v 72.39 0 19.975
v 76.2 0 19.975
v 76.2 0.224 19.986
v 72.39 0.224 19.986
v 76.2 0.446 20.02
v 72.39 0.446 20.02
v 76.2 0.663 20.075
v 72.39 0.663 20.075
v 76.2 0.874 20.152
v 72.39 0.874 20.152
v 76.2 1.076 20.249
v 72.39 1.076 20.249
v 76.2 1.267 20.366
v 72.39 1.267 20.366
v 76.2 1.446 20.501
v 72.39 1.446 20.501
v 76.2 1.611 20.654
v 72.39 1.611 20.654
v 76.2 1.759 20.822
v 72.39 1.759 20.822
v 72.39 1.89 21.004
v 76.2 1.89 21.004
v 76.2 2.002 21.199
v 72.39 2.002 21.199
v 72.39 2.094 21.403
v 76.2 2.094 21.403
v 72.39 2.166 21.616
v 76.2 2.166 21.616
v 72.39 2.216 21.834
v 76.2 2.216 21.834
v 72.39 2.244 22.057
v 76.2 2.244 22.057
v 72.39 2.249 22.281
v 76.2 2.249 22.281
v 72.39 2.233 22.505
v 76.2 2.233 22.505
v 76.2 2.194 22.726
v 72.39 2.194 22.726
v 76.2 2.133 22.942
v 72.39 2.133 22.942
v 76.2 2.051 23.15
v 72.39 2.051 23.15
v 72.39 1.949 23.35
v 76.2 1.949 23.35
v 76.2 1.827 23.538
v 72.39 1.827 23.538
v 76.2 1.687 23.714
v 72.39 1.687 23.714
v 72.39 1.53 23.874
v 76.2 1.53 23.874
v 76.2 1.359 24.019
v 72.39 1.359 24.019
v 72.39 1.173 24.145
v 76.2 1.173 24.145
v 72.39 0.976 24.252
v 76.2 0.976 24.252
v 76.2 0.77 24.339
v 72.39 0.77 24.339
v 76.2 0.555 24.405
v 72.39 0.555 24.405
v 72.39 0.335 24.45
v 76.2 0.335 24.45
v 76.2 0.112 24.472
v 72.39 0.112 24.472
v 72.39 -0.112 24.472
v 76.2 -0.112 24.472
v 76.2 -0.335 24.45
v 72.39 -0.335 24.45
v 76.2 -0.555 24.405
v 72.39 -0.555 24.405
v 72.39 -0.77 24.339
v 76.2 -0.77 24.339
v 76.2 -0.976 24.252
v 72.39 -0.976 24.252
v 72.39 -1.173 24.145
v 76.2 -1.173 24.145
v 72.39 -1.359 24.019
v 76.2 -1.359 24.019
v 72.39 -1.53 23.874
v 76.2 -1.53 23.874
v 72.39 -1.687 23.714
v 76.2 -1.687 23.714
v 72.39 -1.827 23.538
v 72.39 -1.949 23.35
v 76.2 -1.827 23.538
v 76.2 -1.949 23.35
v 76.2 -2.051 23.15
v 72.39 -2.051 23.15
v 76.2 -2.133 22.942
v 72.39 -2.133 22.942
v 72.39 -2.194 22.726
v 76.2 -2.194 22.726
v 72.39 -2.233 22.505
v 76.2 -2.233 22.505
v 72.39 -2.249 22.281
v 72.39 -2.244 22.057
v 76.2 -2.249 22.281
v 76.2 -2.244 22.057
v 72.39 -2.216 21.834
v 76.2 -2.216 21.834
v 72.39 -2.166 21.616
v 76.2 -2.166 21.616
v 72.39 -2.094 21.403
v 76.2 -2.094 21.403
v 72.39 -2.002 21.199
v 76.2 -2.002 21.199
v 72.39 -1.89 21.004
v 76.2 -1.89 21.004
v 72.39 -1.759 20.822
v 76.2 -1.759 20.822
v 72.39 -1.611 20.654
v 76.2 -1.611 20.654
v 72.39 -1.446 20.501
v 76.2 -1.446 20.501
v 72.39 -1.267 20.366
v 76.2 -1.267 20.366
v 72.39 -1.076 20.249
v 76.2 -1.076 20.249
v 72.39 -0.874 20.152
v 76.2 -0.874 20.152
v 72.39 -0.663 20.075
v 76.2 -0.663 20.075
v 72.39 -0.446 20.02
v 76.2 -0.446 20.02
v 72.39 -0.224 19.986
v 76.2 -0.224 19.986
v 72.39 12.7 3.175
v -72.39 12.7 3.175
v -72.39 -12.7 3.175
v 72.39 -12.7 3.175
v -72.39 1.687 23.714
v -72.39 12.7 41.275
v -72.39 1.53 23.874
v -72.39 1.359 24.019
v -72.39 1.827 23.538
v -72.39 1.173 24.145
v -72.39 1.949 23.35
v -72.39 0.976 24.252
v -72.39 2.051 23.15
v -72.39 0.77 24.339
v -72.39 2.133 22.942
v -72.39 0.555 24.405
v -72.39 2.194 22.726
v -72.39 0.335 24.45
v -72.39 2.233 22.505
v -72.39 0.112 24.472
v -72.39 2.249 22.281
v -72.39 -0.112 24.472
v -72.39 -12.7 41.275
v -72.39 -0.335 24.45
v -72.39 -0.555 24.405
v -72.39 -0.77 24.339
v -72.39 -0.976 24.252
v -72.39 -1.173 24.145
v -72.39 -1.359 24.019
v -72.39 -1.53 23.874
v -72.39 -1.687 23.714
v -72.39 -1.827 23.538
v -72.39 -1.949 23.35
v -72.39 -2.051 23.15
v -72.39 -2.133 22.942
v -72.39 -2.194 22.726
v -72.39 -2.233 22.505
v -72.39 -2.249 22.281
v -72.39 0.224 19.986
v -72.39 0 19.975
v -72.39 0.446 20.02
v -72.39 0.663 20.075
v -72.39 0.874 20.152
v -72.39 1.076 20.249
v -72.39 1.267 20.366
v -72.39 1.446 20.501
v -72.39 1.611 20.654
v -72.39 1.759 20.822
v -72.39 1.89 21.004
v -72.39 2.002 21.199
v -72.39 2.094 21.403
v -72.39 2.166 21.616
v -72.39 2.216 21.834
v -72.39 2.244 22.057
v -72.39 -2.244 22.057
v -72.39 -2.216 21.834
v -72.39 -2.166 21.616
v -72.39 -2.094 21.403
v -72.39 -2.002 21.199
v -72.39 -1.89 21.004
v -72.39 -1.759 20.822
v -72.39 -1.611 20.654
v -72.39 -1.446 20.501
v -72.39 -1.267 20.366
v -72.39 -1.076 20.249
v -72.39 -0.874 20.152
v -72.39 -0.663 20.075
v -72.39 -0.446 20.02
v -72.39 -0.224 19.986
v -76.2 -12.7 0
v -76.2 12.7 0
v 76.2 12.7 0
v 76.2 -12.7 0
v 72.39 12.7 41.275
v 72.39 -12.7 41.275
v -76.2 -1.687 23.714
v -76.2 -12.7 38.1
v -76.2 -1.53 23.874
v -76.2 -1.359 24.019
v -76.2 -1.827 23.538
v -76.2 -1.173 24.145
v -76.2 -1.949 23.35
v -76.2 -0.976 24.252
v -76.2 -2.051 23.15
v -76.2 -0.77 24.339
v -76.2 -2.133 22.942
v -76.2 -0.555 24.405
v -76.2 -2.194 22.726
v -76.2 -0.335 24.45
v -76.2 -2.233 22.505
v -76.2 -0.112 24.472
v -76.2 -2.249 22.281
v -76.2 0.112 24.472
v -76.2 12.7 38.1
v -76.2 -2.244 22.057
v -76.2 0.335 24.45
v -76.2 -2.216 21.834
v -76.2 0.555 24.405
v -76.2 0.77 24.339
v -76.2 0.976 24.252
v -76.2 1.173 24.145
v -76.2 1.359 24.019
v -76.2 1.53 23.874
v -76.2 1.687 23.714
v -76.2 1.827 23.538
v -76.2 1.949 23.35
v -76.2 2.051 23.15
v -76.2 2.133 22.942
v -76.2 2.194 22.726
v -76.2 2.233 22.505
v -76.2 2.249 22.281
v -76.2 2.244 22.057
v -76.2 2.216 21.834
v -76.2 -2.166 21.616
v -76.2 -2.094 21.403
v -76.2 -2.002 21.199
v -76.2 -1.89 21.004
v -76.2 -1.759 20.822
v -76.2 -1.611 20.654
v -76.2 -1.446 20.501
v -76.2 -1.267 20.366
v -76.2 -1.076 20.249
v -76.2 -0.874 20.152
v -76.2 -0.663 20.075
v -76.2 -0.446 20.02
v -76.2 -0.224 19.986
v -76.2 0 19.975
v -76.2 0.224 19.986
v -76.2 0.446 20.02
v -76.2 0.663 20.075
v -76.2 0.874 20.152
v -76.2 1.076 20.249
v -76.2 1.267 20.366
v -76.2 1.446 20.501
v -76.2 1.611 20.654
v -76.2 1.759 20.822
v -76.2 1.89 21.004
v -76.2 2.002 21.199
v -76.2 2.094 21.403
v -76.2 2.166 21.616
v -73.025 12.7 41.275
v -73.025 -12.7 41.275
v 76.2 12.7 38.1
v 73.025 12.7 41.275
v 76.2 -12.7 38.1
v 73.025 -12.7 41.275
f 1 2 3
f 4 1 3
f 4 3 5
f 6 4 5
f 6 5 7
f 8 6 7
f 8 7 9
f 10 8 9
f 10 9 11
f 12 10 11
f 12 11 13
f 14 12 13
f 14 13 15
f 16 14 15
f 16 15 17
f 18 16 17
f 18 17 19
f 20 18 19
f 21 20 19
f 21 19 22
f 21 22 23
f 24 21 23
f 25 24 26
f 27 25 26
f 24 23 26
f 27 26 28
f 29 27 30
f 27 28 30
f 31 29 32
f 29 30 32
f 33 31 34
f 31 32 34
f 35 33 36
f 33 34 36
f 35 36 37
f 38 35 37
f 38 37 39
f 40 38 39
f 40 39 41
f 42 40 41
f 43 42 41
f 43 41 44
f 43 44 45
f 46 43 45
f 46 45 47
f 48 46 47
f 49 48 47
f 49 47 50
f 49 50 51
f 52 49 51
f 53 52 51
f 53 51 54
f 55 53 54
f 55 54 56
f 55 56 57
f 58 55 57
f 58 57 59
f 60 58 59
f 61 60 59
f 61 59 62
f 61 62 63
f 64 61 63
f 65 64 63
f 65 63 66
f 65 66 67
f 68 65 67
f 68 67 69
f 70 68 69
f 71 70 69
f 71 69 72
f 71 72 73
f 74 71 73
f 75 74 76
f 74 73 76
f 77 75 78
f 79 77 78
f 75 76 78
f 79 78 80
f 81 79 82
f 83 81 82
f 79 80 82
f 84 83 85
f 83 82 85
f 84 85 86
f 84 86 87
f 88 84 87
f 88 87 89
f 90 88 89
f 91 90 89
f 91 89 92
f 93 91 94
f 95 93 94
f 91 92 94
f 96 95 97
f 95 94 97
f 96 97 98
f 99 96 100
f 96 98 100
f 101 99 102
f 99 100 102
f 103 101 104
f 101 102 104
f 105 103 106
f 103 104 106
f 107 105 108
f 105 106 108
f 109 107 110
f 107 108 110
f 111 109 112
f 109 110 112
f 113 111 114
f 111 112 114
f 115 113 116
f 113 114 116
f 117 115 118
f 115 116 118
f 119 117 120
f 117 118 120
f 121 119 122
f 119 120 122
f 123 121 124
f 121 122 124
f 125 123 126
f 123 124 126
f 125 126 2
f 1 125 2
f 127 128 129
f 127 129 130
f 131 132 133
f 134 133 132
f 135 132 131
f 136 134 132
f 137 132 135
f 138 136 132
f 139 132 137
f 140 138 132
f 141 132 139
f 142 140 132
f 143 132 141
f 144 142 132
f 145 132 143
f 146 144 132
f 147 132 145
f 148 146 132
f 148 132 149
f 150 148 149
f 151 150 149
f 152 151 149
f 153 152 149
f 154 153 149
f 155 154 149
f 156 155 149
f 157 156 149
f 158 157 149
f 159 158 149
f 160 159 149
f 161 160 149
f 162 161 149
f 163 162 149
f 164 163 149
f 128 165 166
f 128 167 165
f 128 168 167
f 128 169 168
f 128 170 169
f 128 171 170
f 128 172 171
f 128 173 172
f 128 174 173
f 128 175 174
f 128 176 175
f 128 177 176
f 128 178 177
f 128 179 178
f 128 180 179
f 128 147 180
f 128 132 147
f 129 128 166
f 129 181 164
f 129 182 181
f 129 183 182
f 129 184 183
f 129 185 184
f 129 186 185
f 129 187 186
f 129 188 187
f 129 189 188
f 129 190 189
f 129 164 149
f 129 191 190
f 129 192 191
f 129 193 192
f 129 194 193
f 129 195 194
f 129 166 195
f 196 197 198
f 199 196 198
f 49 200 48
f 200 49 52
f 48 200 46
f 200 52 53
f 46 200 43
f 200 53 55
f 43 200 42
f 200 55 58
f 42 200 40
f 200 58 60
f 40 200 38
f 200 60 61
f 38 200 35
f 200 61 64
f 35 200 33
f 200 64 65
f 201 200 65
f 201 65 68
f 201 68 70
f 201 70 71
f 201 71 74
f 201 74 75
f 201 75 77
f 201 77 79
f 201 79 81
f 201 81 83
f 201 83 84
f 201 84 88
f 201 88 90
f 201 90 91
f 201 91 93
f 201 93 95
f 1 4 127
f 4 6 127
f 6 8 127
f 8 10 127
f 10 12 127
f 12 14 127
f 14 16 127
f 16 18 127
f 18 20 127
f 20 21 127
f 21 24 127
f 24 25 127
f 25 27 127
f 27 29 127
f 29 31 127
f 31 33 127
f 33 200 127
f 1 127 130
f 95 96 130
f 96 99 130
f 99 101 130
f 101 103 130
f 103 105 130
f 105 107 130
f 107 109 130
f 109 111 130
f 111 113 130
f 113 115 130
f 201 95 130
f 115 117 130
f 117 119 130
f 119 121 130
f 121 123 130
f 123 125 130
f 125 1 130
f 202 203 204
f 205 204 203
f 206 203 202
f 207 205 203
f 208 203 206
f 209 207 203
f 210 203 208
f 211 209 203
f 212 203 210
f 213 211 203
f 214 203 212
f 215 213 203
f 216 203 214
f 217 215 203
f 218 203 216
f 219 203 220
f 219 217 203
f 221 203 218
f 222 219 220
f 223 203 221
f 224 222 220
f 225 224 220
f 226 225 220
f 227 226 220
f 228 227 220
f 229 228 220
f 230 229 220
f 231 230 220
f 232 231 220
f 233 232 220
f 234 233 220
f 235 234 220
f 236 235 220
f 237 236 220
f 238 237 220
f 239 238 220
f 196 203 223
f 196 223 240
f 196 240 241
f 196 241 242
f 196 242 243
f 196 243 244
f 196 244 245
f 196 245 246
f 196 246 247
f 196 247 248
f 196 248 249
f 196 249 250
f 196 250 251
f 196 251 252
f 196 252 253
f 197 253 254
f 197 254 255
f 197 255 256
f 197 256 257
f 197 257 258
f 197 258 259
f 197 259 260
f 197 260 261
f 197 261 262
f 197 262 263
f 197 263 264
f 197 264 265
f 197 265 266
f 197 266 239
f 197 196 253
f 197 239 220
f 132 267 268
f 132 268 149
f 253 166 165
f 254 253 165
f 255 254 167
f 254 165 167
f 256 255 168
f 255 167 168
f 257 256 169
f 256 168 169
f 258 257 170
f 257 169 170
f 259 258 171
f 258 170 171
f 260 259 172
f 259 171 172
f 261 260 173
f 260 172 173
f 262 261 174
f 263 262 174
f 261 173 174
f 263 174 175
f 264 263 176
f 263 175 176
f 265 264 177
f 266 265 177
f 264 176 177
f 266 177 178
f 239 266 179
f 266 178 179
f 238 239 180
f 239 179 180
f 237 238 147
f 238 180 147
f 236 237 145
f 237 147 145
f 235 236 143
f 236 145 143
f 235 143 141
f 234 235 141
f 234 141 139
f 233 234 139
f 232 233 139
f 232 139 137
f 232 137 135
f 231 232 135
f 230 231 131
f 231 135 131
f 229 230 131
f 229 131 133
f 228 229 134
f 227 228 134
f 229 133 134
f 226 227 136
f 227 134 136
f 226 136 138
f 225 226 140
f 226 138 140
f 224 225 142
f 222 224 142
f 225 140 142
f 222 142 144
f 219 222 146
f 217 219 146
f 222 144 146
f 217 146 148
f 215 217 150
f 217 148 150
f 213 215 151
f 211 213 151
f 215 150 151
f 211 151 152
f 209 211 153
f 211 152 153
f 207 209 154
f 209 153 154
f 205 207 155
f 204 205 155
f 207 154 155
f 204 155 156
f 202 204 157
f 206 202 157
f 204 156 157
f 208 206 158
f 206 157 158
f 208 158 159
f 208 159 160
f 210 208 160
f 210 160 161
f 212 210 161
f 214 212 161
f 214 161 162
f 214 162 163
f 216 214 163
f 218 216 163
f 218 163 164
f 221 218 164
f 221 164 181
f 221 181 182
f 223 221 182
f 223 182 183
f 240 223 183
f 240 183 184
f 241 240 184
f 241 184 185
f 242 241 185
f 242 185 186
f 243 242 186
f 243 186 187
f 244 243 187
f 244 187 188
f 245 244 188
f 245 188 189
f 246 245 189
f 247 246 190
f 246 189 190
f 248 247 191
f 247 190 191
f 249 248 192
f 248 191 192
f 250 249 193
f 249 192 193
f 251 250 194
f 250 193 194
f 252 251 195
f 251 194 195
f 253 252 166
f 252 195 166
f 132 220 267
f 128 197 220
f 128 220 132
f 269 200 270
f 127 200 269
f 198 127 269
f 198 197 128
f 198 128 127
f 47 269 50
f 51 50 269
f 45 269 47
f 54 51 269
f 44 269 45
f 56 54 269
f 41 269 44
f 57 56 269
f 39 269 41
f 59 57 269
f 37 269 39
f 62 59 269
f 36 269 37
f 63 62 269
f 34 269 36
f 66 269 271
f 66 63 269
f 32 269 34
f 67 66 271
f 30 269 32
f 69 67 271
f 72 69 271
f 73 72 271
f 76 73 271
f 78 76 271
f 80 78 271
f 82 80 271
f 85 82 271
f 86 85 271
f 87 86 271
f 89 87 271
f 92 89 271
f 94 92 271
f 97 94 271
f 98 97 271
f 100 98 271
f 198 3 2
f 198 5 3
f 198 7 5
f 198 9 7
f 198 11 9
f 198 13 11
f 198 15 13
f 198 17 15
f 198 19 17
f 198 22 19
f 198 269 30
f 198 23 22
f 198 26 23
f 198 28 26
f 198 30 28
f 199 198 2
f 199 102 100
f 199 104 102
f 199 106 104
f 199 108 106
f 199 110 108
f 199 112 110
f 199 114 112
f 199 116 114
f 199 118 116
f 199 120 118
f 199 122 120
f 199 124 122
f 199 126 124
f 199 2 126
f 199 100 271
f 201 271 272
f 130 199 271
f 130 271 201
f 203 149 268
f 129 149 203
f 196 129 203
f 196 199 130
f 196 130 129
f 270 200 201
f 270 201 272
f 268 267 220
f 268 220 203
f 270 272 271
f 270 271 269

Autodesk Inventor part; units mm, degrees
ref_plane "YZ Plane" through (0, 0, 0) normal (1, 0, 0) x (0, 1, 0)
ref_plane "XZ Plane" through (0, 0, 0) normal (0, 1, 0) x (-1, 0, 0)
ref_plane "XY Plane" through (0, 0, 0) normal (0, 0, 1) x (1, 0, 0)
sketch "Sketch1" plane through (0, 0, 0) normal (0, 0, 1) x (1, 0, 0)
  line L0 (76.2, -12.7) -> (-76.2, -12.7)
  line L1 (-76.2, -12.7) -> (-76.2, 12.7)
  line L2 (-76.2, 12.7) -> (76.2, 12.7)
  line L3 (76.2, 12.7) -> (76.2, -12.7)
  line L4 (76.2, -12.7) -> (-76.2, 12.7) construction
  line L5 (-76.2, -12.7) -> (76.2, 12.7) construction
  line L6 (-76.2, 12.7) -> (-72.39, 12.7)
  line L7 (-72.39, 12.7) -> (-72.39, -12.7)
  line L8 (-72.39, -12.7) -> (-76.2, -12.7)
  line L9 (-76.2, -12.7) -> (-76.2, 12.7)
  line L10 (76.2, 12.7) -> (72.39, 12.7)
  line L11 (72.39, 12.7) -> (72.39, -12.7)
  line L12 (72.39, -12.7) -> (76.2, -12.7)
  line L13 (76.2, -12.7) -> (76.2, 12.7)
  point P0 (0, 0)
  dimension "d0" = 152.4
  dimension "d1" = 25.4
  dimension "d2" = 3.81
  dimension "d3" = 3.81
extrude "Extrusion1" add sketch "Sketch1" along normal blind 3.175 contours L0 L7 L2 L11
extrude "Extrusion2" add sketch "Sketch1" along normal blind 41.275 contours L0 L11 L2 L3 | L0 L1 L2 L7
chamfer "Chamfer1" distance 3.175 angle 45 2 edges at (-76.2, 0, 41.275) (76.2, 0, 41.275)
sketch "Sketch2" plane through (76.2, -12.7, 0) normal (1, 0, 0) x (0, 0, -1)
  line L0 (-3.175, 25.4) -> (-41.275, 25.4) construction
  line L1 (-22.225, 25.4) -> (-22.225, 0) construction
  line L2 (0, 0) -> (-38.1, 0) construction
  line L3 (-41.275, 0) -> (-41.275, 25.4) construction
  line L4 (-41.275, 12.7) -> (0, 12.7) construction
  circle A0 centre (-22.225, 12.7) radius 2.25
  line L5 (-3.175, 0) -> (-3.175, 25.4) projected
  dimension "d11" = 4.5
  dimension "d14" = 19.05
extrude "Extrusion3" cut sketch "Sketch2" against normal through all
properties part number "New_Arm_Brace"
